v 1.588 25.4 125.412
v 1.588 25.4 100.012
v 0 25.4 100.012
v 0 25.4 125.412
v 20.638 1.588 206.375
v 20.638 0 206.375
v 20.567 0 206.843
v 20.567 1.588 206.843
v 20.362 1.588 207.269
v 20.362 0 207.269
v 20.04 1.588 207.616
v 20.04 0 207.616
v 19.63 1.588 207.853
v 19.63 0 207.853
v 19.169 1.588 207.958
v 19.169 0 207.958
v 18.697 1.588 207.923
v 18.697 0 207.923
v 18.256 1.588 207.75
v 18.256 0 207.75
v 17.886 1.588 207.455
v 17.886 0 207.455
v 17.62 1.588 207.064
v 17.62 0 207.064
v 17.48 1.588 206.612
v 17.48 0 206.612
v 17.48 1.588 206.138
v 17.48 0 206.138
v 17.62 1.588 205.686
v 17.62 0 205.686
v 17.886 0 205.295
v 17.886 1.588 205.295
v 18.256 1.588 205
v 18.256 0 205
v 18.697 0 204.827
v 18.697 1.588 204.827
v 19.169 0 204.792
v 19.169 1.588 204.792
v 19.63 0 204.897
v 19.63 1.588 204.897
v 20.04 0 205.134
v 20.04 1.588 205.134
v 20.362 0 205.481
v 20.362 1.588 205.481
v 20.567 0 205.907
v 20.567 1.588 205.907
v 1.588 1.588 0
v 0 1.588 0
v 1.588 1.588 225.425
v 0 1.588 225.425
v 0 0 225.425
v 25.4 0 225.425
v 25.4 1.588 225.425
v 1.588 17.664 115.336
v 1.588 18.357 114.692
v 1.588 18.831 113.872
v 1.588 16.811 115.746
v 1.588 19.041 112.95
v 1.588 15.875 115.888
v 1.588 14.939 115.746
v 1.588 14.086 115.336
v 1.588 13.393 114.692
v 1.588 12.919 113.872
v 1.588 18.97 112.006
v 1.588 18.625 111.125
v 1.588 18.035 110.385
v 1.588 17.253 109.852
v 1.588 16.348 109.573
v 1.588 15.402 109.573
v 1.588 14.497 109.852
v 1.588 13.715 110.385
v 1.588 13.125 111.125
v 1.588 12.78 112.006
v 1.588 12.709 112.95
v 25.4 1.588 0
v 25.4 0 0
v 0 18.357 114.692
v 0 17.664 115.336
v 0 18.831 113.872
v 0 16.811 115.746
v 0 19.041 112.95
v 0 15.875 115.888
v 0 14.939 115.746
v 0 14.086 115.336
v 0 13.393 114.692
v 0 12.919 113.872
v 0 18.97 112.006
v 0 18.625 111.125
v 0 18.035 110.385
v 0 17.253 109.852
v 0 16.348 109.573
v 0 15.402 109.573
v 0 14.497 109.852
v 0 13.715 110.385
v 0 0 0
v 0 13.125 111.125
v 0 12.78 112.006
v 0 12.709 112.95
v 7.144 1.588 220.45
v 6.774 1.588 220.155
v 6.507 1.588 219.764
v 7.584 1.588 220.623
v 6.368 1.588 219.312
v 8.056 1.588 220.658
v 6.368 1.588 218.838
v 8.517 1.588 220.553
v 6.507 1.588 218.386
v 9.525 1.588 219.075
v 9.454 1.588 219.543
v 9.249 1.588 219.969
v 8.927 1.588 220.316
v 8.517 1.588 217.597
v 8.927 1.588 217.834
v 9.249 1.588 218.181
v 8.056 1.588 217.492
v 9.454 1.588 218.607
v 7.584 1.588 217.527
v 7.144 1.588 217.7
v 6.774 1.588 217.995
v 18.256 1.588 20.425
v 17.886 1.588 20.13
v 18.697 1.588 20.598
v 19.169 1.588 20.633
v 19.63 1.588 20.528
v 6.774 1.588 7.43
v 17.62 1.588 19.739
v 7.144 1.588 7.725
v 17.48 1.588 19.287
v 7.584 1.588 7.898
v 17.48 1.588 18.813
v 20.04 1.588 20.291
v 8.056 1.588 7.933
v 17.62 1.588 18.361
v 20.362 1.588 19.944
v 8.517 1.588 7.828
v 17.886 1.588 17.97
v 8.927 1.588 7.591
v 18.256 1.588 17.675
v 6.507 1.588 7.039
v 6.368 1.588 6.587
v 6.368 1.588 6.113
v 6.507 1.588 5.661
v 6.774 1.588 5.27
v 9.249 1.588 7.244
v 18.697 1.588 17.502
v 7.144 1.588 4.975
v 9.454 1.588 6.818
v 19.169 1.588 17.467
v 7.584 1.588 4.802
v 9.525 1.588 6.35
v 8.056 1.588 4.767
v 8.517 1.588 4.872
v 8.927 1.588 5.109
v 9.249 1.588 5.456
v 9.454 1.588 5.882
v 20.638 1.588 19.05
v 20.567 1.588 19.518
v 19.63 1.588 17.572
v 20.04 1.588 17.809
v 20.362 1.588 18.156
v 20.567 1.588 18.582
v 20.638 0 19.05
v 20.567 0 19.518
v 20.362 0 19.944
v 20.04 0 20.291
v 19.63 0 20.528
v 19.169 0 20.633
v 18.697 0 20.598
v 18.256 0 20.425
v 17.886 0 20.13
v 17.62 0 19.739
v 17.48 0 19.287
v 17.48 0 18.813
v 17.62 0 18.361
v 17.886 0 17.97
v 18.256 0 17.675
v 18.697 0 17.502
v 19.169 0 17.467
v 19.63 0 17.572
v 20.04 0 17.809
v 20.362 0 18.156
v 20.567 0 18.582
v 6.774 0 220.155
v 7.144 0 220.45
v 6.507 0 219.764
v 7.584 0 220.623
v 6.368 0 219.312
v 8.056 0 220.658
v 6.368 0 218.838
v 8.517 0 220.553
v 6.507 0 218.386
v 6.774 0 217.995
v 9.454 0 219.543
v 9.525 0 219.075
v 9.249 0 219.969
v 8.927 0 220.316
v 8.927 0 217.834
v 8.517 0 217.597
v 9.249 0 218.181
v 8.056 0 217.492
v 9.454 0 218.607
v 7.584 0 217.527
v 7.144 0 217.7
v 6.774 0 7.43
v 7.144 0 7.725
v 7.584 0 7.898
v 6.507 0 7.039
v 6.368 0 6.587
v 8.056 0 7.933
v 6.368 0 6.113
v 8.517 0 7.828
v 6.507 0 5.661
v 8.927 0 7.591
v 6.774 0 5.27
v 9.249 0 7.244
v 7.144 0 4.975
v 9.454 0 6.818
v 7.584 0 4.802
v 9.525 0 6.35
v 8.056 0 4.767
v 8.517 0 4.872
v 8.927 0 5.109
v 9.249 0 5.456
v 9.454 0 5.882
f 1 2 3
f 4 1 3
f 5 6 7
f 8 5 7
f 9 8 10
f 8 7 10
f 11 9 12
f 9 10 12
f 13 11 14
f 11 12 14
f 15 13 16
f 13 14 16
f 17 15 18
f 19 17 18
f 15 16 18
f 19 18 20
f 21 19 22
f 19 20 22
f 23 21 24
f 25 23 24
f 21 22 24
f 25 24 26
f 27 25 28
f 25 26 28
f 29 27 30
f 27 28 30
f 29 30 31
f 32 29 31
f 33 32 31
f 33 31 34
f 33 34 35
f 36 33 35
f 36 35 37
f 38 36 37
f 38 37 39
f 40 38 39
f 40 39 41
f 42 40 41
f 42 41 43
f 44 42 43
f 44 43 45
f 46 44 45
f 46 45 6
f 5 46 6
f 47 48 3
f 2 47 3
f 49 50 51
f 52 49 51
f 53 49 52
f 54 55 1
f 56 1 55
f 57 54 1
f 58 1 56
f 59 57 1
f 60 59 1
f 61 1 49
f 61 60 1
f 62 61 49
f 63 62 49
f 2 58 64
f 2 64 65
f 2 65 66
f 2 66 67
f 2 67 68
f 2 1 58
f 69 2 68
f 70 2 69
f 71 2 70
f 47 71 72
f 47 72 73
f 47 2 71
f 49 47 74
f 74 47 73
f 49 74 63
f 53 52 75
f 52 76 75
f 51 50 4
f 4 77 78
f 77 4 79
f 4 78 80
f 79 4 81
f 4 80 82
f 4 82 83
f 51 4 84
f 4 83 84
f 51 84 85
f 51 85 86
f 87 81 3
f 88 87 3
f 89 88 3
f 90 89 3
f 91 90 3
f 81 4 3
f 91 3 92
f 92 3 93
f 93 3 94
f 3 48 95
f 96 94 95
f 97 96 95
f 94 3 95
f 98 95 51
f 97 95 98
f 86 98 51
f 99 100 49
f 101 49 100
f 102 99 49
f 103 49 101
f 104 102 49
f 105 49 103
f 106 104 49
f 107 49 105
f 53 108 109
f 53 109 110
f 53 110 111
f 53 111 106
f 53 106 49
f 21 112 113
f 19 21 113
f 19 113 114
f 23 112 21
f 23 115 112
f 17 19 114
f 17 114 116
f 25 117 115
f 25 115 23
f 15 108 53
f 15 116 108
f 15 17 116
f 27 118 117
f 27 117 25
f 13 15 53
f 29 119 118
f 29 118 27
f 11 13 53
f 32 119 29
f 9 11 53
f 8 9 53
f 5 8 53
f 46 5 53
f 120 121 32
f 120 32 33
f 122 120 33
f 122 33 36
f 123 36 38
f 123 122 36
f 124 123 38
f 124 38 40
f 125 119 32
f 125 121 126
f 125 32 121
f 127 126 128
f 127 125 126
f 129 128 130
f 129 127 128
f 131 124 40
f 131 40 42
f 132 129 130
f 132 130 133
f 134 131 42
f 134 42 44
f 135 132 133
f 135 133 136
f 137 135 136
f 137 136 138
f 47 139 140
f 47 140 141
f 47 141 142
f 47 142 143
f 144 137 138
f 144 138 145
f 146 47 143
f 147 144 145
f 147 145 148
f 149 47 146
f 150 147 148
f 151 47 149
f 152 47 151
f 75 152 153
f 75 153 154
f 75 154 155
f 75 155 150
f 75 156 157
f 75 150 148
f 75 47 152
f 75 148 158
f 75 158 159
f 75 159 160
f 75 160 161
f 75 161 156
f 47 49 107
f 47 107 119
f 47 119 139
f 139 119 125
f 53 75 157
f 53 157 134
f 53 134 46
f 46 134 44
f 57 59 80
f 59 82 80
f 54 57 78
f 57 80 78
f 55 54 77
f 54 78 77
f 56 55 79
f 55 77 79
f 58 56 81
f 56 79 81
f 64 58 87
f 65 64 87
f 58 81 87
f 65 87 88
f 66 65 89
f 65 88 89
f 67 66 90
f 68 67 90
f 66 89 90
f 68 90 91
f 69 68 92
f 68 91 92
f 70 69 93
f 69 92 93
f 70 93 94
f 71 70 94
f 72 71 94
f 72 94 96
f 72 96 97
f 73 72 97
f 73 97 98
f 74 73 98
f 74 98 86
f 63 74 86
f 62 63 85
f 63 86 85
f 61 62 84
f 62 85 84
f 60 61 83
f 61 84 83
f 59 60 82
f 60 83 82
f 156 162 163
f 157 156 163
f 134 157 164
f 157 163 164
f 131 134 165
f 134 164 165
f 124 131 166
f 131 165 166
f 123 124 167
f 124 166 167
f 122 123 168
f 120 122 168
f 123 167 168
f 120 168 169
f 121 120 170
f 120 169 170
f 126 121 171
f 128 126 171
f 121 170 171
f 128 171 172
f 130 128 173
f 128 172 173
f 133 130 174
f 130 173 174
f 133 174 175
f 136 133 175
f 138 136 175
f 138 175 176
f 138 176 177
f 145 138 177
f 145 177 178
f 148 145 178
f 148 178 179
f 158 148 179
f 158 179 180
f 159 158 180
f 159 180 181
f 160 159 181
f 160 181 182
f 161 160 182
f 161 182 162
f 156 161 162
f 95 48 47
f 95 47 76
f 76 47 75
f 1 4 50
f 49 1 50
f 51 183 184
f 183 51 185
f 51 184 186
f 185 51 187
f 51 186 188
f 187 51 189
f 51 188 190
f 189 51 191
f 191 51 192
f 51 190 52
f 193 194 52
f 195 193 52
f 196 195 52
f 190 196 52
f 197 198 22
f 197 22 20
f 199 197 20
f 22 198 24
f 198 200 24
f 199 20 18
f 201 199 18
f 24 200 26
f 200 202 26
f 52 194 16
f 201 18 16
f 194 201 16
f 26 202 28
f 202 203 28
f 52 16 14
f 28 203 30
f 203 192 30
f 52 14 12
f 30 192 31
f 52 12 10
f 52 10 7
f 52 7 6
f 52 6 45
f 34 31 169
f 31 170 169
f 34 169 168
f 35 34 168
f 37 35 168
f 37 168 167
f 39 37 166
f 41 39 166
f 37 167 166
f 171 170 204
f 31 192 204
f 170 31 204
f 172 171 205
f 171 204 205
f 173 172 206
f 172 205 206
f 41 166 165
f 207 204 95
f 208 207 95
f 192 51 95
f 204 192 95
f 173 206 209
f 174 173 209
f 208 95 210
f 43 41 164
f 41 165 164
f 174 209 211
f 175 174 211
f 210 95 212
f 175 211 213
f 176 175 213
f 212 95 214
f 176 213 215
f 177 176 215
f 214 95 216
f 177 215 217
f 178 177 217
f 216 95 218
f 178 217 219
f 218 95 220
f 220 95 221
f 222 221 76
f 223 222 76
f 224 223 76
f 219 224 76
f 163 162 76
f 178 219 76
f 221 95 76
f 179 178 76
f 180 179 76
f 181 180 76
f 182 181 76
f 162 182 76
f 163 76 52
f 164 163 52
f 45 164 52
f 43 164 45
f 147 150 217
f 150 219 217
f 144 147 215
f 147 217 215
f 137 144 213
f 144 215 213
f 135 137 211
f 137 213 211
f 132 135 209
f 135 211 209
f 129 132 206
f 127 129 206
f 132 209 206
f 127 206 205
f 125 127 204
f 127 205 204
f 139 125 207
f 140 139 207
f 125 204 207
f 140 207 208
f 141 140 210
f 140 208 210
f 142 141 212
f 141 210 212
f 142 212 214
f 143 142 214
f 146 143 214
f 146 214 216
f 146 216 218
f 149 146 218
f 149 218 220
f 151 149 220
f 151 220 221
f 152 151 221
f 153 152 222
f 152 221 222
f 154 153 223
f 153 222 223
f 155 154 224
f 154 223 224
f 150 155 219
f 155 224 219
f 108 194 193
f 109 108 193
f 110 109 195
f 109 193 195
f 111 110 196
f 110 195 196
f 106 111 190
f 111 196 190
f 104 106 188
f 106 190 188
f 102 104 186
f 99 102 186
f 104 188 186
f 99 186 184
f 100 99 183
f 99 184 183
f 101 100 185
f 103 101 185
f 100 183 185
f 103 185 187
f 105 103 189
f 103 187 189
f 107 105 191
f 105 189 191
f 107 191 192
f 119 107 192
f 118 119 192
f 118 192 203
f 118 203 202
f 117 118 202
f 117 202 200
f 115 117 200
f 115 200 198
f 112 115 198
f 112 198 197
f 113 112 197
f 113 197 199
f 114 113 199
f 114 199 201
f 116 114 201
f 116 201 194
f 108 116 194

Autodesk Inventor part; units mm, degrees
ref_plane "YZ Plane" through (0, 0, 0) normal (1, 0, 0) x (0, 1, 0)
ref_plane "XZ Plane" through (0, 0, 0) normal (0, 1, 0) x (-1, 0, 0)
ref_plane "XY Plane" through (0, 0, 0) normal (0, 0, 1) x (1, 0, 0)
sketch "Sketch1" plane through (0, 0, 0) normal (0, 0, 1) x (1, 0, 0)
  line L0 (0, 0) -> (25.4, 0)
  line L1 (25.4, 0) -> (25.4, 25.4)
  line L2 (25.4, 25.4) -> (0, 25.4)
  line L3 (0, 25.4) -> (0, 0)
  line L4 (25.4, 25.4) -> (1.5875, 25.4)
  line L5 (1.5875, 25.4) -> (1.5875, 1.5875)
  line L6 (1.5875, 1.5875) -> (25.4, 1.5875)
  line L7 (25.4, 1.5875) -> (25.4, 25.4)
  dimension "d0" = 1.5875
  dimension "d1" = 1.5875
  dimension "d2" = 25.4
  dimension "d3" = 25.4
extrude "Extrusion1" add sketch "Sketch1" along normal blind 225.425 contours L3 L2 L5 L6 L1 L0
sketch "Sketch2" plane through (0, 0, 0) normal (0, -1, 0) x (1, 0, 0)
  line L0 (25.4, 225.425) -> (0, 225.425) projected
  line L1 (0, 0) -> (0, 225.425) projected
  line L2 (25.4, 0) -> (25.4, 225.425) projected
  circle A0 centre (7.9375, 219.075) radius 1.5875
  circle A1 centre (19.05, 206.375) radius 1.5875
  line L3 (0, 112.7125) -> (25.4, 112.7125)
  circle A2 centre (7.9375, 6.35) radius 1.5875
  circle A3 centre (19.05, 19.05) radius 1.5875
  dimension "d6" = 3.175
  dimension "d7" = 6.35
  dimension "d8" = 7.9375
  dimension "d9" = 19.05
  dimension "d10" = 6.35
extrude "Extrusion2" cut sketch "Sketch2" against normal blind 225.425 contours A0 | A1 | A2 | A3
sketch "Sketch3" plane through (0, 0, 0) normal (-1, 0, 0) x (0, 0, 1)
  line L0 (225.425, 0) -> (225.425, 25.4) projected
  line L1 (0, 25.4) -> (225.425, 25.4) projected
  line L2 (0, 25.4) -> (0, 0) projected
  line L3 (0, 0) -> (225.425, 0) projected
  circle A0 centre (112.7125, 15.875) radius 3.175
  line L4 (0, 1.5875) -> (100.0125, 25.4)
  line L5 (125.4125, 25.4) -> (225.425, 1.5875)
  dimension "d13" = 6.35
  dimension "d14" = 15.875
  dimension "d15" = 112.7125
  dimension "d16" = 1.5875
  dimension "d17" = 1.5875
  dimension "d18" = 12.7
  dimension "d19" = 25.4
extrude "Extrusion3" cut sketch "Sketch3" against normal blind 225.425 contours L5 L1 L0 | L2 L1 L4 | A0
equation "\"d0\" = d1"
equation "\"d3\" = d2"
equation "\"d18\" = 0.5 * d19"
properties part number "8 ball top lift point"
